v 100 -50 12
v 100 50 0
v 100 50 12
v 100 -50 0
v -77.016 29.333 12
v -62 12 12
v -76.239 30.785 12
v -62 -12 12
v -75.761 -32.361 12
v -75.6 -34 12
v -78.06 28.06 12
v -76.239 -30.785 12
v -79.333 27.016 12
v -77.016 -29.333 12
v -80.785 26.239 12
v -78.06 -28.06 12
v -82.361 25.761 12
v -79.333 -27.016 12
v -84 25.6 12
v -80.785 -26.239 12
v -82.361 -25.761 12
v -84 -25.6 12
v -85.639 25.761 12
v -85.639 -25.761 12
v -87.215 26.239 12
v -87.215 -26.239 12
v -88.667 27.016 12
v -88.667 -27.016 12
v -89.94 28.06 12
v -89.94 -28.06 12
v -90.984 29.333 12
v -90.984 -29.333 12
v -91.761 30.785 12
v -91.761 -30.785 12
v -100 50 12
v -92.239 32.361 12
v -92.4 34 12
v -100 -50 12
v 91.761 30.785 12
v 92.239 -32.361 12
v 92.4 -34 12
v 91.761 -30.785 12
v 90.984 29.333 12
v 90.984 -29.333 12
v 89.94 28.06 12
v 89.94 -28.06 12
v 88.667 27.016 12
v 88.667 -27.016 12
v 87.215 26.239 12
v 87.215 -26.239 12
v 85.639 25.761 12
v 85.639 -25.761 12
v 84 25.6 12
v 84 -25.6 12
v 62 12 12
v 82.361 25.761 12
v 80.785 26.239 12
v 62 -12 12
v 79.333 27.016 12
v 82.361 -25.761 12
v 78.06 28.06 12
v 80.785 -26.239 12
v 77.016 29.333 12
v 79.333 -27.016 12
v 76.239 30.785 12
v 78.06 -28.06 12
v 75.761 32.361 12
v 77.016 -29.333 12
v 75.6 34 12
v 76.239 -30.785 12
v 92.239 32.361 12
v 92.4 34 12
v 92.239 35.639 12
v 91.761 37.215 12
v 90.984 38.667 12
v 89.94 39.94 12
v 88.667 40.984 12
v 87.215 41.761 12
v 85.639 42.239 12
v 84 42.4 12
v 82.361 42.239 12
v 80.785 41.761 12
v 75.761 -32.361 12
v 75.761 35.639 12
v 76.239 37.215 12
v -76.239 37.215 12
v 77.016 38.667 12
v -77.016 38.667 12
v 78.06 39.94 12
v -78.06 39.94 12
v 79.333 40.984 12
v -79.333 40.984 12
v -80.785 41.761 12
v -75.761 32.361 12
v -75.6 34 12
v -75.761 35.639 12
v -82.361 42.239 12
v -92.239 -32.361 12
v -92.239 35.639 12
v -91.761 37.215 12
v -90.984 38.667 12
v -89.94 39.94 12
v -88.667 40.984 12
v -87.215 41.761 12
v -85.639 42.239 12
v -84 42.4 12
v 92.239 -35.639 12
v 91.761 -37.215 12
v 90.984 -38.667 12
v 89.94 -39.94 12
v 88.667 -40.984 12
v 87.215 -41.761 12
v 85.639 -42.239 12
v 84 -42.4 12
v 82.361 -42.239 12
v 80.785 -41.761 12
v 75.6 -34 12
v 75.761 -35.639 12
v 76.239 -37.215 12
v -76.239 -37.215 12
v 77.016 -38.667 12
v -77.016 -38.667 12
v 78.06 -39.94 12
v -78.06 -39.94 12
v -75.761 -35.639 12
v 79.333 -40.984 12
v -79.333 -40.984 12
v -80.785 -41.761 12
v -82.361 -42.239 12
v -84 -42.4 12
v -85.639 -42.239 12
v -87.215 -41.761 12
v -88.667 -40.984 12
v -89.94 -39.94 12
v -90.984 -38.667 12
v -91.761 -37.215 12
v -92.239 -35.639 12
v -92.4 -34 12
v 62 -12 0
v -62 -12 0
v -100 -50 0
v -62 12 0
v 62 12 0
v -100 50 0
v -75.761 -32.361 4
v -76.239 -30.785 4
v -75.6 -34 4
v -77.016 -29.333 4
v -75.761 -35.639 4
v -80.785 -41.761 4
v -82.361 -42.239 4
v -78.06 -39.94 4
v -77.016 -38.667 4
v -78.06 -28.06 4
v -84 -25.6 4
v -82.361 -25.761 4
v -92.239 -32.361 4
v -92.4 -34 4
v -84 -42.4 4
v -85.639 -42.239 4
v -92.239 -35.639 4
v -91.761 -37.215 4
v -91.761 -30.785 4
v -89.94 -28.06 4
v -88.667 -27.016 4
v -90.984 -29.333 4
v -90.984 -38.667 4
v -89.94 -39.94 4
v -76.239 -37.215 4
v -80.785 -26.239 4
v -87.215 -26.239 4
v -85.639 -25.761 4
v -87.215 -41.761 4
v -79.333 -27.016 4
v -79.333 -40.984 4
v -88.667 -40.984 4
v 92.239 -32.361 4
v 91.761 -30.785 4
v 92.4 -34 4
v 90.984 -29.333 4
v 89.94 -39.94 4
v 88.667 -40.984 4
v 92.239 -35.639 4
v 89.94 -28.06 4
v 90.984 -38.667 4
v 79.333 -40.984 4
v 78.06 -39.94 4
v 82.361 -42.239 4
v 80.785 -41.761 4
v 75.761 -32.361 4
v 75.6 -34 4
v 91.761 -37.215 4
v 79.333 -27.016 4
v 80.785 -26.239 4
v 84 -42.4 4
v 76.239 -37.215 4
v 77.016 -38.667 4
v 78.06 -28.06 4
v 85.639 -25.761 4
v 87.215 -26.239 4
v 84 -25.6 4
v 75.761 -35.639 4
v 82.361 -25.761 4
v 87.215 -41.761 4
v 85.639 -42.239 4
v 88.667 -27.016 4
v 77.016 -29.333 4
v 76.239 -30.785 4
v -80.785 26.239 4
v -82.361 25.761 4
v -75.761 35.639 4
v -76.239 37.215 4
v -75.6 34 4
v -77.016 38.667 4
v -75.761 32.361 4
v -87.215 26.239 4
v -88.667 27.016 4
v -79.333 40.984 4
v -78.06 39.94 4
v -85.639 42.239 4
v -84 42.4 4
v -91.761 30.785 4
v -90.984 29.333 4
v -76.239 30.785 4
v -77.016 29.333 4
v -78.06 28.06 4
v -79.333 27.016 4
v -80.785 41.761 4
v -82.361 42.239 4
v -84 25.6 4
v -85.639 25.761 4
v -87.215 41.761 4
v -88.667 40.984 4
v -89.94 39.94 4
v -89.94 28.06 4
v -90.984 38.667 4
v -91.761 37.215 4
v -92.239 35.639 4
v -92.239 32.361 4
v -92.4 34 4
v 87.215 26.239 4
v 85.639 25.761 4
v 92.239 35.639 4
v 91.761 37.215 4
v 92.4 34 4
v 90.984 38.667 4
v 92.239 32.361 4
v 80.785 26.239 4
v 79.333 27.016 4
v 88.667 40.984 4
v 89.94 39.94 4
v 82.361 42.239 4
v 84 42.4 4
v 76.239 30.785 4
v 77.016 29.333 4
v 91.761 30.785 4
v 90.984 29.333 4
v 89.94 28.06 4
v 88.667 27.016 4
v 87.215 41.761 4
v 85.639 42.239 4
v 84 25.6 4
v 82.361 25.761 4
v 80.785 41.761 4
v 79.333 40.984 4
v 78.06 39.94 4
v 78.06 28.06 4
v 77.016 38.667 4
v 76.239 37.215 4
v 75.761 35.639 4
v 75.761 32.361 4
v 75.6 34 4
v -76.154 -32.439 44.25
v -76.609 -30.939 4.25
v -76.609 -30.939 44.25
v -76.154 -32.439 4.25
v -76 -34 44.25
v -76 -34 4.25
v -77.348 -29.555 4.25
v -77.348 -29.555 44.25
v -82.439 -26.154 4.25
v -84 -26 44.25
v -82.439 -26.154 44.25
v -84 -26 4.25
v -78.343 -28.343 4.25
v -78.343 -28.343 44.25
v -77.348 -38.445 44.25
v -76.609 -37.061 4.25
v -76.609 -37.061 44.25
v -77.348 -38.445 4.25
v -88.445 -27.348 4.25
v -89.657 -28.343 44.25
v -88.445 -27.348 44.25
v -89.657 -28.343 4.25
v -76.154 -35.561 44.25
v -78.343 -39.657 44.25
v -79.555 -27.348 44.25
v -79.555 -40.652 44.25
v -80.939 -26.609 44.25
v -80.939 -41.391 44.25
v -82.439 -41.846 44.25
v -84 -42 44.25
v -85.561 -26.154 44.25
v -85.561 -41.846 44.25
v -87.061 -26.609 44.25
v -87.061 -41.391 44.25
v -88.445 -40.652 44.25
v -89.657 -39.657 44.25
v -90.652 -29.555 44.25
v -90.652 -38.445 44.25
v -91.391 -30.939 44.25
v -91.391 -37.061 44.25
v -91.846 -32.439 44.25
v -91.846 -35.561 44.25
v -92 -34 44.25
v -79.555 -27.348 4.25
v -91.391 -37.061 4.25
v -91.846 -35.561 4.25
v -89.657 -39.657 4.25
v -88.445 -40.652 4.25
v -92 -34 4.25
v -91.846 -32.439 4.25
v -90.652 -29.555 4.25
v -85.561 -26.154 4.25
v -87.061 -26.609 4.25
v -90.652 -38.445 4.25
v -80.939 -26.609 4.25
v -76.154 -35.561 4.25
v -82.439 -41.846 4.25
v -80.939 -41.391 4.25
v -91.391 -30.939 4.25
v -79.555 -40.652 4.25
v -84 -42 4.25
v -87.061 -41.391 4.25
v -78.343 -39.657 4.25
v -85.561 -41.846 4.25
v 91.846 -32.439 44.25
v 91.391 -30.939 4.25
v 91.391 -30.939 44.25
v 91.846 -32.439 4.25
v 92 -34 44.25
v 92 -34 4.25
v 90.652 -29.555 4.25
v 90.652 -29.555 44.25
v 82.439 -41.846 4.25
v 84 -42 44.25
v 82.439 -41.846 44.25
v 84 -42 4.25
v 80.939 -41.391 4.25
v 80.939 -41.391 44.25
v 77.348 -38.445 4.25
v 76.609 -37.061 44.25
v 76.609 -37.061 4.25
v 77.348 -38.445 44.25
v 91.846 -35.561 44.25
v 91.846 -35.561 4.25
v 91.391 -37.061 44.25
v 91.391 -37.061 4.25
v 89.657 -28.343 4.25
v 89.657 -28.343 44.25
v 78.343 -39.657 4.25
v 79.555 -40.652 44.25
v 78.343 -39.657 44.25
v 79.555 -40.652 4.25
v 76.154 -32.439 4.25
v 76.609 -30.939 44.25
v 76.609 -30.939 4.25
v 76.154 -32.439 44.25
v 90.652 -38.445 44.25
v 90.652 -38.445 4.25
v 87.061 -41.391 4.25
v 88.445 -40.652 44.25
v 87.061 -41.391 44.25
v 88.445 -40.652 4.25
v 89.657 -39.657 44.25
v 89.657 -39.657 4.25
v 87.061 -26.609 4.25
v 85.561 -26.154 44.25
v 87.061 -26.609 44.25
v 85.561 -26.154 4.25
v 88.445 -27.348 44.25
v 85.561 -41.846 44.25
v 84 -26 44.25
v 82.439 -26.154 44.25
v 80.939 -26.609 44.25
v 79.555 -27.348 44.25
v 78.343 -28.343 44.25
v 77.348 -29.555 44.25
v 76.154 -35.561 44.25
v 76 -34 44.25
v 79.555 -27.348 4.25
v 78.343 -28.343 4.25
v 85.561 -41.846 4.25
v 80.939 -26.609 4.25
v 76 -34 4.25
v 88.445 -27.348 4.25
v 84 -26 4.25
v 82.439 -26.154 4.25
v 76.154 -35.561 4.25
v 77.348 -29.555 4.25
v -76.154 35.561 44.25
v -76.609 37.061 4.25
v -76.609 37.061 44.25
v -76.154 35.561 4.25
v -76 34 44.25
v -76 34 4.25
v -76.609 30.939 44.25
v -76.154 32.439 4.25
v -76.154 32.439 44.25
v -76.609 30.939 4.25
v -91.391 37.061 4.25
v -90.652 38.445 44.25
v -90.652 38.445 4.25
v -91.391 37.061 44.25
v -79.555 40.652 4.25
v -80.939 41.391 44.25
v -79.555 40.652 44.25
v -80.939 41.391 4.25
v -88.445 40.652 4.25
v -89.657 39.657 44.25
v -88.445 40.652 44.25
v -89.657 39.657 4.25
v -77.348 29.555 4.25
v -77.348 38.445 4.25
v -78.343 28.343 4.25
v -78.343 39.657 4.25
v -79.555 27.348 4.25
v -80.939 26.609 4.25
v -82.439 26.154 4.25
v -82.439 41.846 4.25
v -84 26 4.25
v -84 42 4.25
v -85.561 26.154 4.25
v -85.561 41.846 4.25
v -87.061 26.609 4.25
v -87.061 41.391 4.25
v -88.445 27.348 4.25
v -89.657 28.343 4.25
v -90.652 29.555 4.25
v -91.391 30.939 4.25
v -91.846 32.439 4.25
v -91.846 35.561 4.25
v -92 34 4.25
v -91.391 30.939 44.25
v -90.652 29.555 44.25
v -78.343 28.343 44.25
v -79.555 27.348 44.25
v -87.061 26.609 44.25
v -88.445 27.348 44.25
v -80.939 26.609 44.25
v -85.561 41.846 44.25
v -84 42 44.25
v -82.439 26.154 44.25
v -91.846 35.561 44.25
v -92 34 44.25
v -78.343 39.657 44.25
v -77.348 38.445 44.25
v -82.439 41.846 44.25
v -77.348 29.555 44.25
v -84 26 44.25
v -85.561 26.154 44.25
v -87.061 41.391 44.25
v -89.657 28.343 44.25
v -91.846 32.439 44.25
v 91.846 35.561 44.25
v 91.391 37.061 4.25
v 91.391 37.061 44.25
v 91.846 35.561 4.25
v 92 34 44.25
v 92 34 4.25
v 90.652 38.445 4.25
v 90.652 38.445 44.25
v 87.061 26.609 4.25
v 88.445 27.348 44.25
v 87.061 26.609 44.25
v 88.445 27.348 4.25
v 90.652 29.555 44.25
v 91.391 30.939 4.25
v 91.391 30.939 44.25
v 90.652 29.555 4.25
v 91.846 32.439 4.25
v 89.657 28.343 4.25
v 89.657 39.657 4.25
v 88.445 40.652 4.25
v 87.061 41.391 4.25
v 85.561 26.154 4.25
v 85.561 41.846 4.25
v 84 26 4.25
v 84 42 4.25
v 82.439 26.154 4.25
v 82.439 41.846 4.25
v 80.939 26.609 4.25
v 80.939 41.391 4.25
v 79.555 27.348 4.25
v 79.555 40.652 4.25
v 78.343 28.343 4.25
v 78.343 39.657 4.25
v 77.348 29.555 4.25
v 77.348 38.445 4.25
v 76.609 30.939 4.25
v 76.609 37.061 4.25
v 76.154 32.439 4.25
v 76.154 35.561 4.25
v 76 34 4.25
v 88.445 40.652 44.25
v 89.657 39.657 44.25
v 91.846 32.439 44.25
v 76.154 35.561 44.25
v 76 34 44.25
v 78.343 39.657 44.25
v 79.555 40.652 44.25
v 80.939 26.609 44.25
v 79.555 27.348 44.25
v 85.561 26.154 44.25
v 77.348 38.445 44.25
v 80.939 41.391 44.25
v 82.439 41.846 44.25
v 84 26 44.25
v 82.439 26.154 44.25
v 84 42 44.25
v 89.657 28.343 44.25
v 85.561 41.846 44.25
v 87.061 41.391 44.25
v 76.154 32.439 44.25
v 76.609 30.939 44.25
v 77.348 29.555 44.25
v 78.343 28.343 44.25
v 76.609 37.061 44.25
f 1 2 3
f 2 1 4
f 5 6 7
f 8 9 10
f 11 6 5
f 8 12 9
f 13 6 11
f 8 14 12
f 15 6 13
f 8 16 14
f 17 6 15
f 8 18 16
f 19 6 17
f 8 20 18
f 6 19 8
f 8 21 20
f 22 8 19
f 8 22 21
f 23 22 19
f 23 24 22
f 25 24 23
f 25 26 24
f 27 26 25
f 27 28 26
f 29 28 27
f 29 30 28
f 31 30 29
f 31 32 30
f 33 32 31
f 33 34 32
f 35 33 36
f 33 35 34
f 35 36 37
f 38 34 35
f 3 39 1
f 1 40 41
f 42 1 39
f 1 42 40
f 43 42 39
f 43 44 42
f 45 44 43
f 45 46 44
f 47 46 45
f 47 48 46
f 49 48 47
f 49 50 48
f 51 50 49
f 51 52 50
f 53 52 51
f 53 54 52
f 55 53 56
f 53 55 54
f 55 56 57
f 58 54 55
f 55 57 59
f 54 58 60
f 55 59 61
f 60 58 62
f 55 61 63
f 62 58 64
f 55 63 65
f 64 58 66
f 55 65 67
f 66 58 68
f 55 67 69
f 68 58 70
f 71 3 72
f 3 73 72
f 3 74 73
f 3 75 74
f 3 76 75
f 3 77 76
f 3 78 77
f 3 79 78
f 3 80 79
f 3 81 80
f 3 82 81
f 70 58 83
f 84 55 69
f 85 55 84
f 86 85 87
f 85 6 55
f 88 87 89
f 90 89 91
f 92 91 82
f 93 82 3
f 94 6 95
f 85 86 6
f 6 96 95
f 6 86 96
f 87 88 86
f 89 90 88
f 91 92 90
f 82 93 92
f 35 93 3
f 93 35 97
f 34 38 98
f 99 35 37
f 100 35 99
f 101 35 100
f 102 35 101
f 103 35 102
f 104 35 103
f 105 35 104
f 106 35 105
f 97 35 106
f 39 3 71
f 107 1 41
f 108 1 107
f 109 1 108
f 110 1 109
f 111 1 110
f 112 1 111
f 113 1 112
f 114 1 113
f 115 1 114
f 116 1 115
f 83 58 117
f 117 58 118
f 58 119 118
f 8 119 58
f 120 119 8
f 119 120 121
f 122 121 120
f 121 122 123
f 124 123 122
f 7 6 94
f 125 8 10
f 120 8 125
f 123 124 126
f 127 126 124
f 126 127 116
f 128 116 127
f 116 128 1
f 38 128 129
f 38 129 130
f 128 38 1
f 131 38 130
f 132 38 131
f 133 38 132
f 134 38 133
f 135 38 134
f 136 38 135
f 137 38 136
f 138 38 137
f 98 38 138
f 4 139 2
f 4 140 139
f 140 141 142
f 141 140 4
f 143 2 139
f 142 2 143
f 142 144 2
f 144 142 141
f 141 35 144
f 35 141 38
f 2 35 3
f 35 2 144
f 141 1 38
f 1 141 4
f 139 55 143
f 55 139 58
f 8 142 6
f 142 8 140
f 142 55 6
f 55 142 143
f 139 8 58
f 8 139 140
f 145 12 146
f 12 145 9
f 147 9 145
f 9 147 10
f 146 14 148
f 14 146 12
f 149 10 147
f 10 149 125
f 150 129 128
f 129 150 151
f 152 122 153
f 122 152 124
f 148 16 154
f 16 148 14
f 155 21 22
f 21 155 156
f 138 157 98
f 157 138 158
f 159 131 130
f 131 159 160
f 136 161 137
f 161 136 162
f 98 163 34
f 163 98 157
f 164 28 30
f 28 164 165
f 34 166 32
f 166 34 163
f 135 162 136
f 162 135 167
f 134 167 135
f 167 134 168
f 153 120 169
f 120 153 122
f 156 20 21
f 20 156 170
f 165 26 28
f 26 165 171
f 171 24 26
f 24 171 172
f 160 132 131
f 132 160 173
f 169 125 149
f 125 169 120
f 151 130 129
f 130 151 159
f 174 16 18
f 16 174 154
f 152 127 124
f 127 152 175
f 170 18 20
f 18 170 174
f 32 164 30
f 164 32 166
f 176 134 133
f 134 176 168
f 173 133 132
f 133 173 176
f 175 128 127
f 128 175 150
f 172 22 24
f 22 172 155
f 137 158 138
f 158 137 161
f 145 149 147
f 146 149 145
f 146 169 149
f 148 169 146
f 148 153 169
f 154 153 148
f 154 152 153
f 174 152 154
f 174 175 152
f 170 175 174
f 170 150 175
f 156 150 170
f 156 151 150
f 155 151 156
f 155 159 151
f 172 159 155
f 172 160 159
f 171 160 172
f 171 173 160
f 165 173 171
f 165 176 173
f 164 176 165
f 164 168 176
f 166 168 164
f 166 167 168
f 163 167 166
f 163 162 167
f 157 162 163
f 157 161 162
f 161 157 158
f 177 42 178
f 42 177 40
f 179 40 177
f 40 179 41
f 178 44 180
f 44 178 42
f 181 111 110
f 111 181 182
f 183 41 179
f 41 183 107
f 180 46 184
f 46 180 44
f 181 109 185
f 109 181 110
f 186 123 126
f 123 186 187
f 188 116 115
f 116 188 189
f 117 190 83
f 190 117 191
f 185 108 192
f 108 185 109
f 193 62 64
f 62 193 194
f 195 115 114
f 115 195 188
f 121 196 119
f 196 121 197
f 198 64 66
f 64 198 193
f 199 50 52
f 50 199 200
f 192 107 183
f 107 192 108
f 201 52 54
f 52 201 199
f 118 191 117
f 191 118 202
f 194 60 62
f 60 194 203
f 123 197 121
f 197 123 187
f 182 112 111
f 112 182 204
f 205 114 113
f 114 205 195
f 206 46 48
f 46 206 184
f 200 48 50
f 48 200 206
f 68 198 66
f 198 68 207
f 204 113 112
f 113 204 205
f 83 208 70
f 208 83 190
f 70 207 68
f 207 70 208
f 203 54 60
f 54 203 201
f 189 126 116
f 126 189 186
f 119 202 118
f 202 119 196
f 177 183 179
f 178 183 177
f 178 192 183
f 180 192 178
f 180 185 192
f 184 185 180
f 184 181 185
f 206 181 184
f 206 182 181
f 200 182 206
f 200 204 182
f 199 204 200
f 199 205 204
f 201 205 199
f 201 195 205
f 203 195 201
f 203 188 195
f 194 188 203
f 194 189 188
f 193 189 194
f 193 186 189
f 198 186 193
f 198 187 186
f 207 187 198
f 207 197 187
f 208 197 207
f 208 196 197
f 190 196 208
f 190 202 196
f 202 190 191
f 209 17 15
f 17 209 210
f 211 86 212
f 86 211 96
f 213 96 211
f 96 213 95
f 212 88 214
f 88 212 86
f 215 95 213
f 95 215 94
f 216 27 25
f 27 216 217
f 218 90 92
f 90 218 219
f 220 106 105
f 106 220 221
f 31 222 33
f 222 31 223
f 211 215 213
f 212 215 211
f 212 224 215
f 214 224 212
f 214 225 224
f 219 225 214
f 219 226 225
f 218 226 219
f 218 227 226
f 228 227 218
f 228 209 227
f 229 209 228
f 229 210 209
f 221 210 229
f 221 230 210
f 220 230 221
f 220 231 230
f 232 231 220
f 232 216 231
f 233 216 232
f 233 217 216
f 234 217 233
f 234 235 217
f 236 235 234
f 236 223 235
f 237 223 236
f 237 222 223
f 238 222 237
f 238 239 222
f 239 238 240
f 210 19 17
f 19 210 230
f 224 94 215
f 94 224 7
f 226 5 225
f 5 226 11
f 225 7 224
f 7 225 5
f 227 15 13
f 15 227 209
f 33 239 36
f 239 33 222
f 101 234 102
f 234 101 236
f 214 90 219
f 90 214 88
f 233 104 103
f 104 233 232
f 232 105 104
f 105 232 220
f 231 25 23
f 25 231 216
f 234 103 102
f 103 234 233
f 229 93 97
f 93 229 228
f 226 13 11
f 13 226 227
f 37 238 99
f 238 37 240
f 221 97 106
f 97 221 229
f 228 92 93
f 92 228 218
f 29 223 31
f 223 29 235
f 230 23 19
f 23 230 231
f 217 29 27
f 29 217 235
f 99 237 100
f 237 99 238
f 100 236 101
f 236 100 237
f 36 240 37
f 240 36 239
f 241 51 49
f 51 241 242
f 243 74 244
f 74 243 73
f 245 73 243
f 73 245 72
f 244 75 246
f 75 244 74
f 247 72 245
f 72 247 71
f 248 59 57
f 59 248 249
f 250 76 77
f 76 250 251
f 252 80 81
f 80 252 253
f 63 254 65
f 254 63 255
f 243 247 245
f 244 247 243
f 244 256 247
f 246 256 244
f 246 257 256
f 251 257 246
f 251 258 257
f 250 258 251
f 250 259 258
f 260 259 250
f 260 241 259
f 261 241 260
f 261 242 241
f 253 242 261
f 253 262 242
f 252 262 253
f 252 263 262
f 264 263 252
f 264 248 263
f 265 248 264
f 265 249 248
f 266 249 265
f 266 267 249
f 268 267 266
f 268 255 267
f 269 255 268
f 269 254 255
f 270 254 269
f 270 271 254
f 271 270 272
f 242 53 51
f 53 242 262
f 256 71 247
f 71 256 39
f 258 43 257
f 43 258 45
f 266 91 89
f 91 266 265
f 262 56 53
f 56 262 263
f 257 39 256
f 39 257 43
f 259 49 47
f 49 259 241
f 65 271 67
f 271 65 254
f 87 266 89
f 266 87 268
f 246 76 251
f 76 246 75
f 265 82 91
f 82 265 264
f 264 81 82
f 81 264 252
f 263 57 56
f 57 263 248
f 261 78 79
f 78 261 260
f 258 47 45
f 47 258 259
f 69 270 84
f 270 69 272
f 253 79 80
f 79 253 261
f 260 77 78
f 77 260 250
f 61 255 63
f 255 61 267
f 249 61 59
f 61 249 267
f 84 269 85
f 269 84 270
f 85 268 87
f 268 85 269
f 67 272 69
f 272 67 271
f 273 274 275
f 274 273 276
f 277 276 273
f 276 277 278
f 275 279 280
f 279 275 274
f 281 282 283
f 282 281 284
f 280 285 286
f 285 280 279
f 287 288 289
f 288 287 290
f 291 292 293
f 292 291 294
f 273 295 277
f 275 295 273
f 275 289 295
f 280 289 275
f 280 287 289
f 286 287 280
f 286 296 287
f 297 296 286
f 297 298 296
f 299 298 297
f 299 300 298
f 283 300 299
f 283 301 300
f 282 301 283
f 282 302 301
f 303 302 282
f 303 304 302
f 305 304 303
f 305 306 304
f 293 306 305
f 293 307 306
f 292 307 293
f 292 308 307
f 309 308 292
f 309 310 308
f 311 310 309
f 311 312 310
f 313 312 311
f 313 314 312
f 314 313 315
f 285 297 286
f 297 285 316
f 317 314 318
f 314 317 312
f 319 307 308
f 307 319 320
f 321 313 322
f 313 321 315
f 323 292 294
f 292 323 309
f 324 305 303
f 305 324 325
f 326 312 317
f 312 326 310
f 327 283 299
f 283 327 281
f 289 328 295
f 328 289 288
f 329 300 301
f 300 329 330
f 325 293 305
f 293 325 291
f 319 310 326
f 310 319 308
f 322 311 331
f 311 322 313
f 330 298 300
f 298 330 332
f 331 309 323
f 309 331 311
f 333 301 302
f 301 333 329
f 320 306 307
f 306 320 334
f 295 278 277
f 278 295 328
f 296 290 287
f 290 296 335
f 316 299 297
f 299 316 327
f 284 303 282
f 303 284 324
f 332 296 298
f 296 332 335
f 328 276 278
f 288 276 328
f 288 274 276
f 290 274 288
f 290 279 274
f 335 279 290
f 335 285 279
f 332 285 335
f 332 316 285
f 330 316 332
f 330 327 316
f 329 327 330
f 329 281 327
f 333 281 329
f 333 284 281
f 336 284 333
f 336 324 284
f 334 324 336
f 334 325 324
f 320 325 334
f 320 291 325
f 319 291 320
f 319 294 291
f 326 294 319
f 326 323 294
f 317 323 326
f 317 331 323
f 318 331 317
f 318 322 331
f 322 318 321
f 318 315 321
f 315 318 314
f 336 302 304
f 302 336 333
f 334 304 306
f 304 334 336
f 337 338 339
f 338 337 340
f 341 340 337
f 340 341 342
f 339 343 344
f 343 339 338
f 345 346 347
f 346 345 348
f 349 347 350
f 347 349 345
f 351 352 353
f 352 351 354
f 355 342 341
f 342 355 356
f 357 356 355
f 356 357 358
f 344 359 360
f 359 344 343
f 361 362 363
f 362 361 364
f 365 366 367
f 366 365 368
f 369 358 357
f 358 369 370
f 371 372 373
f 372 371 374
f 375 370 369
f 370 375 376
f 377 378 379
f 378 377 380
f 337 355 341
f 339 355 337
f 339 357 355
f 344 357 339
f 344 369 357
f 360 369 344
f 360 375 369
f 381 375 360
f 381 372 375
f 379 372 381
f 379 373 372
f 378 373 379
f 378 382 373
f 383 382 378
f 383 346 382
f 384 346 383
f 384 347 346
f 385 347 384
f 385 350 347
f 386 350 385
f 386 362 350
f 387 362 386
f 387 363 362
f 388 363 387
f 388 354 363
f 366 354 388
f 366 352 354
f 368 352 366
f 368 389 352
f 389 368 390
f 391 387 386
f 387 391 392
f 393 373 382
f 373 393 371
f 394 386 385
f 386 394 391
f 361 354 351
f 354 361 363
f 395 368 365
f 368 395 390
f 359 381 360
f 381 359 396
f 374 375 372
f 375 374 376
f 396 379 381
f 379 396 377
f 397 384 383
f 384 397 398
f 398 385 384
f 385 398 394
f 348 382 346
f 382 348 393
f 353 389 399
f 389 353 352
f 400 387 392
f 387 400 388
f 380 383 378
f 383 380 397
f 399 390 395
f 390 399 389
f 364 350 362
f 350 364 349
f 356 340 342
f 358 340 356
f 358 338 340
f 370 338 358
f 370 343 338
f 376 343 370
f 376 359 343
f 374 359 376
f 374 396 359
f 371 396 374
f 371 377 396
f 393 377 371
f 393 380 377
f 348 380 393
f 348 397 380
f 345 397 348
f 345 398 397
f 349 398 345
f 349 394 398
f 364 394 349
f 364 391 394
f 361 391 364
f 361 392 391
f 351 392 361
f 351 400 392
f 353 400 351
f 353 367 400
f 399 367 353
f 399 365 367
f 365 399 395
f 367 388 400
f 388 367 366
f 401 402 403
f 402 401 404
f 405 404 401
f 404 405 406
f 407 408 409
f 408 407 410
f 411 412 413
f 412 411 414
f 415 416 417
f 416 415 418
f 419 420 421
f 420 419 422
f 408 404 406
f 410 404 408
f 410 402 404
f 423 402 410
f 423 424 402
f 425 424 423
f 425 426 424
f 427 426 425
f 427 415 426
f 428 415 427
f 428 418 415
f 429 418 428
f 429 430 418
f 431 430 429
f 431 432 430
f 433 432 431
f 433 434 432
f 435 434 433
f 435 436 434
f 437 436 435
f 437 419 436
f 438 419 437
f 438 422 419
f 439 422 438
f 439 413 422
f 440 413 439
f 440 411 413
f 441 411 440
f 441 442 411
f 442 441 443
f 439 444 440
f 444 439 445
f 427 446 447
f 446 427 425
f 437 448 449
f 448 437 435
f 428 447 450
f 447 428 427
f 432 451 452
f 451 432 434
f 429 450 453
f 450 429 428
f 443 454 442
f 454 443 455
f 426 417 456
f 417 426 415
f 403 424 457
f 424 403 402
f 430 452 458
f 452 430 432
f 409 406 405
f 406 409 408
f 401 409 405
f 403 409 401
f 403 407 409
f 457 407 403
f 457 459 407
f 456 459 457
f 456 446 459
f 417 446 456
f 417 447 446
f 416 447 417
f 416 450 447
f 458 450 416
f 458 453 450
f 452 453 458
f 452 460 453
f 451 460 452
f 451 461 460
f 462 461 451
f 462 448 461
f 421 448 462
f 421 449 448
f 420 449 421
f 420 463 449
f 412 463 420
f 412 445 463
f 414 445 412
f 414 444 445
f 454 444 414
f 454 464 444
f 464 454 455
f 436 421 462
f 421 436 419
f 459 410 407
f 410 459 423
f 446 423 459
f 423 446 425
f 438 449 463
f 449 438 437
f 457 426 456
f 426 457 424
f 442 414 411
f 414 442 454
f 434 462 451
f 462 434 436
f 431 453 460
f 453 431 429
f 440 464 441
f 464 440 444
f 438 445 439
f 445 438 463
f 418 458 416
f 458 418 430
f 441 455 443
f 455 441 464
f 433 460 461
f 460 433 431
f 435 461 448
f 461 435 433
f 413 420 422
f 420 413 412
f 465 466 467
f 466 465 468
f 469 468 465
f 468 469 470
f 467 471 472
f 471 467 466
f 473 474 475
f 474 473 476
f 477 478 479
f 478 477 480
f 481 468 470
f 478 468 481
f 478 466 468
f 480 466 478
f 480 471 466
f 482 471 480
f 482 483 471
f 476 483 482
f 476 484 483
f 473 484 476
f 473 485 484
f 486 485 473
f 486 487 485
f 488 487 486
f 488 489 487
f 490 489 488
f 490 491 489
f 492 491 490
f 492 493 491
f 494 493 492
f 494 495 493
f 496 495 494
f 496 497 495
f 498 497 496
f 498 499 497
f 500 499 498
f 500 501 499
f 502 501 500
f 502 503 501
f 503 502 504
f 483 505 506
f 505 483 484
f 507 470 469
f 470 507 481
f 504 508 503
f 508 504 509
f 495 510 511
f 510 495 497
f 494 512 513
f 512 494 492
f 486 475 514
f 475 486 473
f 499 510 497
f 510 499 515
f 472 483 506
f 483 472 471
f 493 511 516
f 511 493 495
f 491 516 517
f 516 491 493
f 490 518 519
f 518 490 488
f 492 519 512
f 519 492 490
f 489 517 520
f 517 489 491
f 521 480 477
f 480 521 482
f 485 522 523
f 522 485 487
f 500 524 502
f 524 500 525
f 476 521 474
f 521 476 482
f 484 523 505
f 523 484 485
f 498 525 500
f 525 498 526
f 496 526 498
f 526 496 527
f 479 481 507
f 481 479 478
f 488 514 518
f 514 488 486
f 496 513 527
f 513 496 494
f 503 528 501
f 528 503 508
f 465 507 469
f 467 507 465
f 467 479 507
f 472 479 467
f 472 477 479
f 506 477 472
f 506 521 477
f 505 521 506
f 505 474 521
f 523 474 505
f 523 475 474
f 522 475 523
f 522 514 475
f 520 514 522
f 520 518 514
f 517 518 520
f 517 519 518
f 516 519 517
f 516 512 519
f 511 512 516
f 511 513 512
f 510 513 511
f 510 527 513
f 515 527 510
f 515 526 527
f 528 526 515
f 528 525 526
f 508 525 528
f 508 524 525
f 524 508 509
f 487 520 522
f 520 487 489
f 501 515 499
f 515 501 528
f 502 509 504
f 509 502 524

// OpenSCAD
$fn = 32;

// ------------------------------------------------------------------------
// Frame with four posts: 200 x 100 mm frame, four d16 posts
// Every part is its own module, assembly() places them once.
// ------------------------------------------------------------------------

// --- part 1 ---
module base_frame() {
  difference() {
    translate([-100, -50, 0]) cube([200, 100, 12]);
    translate([-62, -12, -1]) cube([124, 24, 14]);
    translate([-84, -34, 4]) cylinder(h = 9, d = 16.8);
    translate([84, -34, 4]) cylinder(h = 9, d = 16.8);
    translate([-84, 34, 4]) cylinder(h = 9, d = 16.8);
    translate([84, 34, 4]) cylinder(h = 9, d = 16.8);
  }
}

// --- part 2 ---
module post1() {
  cylinder(h = 40, d = 16);
}

// --- part 3 ---
module post2() {
  cylinder(h = 40, d = 16);
}

// --- part 4 ---
module post3() {
  cylinder(h = 40, d = 16);
}

// --- part 5 ---
module post4() {
  cylinder(h = 40, d = 16);
}

// --- assembly ---
module assembly() {
  translate([0, 0, 0]) rotate([0, 0, 0]) base_frame();
  translate([-84, -34, 4.25]) rotate([0, 0, 0]) post1();
  translate([84, -34, 4.25]) rotate([0, 0, 0]) post2();
  translate([-84, 34, 4.25]) rotate([0, 0, 0]) post3();
  translate([84, 34, 4.25]) rotate([0, 0, 0]) post4();
}

assembly();
